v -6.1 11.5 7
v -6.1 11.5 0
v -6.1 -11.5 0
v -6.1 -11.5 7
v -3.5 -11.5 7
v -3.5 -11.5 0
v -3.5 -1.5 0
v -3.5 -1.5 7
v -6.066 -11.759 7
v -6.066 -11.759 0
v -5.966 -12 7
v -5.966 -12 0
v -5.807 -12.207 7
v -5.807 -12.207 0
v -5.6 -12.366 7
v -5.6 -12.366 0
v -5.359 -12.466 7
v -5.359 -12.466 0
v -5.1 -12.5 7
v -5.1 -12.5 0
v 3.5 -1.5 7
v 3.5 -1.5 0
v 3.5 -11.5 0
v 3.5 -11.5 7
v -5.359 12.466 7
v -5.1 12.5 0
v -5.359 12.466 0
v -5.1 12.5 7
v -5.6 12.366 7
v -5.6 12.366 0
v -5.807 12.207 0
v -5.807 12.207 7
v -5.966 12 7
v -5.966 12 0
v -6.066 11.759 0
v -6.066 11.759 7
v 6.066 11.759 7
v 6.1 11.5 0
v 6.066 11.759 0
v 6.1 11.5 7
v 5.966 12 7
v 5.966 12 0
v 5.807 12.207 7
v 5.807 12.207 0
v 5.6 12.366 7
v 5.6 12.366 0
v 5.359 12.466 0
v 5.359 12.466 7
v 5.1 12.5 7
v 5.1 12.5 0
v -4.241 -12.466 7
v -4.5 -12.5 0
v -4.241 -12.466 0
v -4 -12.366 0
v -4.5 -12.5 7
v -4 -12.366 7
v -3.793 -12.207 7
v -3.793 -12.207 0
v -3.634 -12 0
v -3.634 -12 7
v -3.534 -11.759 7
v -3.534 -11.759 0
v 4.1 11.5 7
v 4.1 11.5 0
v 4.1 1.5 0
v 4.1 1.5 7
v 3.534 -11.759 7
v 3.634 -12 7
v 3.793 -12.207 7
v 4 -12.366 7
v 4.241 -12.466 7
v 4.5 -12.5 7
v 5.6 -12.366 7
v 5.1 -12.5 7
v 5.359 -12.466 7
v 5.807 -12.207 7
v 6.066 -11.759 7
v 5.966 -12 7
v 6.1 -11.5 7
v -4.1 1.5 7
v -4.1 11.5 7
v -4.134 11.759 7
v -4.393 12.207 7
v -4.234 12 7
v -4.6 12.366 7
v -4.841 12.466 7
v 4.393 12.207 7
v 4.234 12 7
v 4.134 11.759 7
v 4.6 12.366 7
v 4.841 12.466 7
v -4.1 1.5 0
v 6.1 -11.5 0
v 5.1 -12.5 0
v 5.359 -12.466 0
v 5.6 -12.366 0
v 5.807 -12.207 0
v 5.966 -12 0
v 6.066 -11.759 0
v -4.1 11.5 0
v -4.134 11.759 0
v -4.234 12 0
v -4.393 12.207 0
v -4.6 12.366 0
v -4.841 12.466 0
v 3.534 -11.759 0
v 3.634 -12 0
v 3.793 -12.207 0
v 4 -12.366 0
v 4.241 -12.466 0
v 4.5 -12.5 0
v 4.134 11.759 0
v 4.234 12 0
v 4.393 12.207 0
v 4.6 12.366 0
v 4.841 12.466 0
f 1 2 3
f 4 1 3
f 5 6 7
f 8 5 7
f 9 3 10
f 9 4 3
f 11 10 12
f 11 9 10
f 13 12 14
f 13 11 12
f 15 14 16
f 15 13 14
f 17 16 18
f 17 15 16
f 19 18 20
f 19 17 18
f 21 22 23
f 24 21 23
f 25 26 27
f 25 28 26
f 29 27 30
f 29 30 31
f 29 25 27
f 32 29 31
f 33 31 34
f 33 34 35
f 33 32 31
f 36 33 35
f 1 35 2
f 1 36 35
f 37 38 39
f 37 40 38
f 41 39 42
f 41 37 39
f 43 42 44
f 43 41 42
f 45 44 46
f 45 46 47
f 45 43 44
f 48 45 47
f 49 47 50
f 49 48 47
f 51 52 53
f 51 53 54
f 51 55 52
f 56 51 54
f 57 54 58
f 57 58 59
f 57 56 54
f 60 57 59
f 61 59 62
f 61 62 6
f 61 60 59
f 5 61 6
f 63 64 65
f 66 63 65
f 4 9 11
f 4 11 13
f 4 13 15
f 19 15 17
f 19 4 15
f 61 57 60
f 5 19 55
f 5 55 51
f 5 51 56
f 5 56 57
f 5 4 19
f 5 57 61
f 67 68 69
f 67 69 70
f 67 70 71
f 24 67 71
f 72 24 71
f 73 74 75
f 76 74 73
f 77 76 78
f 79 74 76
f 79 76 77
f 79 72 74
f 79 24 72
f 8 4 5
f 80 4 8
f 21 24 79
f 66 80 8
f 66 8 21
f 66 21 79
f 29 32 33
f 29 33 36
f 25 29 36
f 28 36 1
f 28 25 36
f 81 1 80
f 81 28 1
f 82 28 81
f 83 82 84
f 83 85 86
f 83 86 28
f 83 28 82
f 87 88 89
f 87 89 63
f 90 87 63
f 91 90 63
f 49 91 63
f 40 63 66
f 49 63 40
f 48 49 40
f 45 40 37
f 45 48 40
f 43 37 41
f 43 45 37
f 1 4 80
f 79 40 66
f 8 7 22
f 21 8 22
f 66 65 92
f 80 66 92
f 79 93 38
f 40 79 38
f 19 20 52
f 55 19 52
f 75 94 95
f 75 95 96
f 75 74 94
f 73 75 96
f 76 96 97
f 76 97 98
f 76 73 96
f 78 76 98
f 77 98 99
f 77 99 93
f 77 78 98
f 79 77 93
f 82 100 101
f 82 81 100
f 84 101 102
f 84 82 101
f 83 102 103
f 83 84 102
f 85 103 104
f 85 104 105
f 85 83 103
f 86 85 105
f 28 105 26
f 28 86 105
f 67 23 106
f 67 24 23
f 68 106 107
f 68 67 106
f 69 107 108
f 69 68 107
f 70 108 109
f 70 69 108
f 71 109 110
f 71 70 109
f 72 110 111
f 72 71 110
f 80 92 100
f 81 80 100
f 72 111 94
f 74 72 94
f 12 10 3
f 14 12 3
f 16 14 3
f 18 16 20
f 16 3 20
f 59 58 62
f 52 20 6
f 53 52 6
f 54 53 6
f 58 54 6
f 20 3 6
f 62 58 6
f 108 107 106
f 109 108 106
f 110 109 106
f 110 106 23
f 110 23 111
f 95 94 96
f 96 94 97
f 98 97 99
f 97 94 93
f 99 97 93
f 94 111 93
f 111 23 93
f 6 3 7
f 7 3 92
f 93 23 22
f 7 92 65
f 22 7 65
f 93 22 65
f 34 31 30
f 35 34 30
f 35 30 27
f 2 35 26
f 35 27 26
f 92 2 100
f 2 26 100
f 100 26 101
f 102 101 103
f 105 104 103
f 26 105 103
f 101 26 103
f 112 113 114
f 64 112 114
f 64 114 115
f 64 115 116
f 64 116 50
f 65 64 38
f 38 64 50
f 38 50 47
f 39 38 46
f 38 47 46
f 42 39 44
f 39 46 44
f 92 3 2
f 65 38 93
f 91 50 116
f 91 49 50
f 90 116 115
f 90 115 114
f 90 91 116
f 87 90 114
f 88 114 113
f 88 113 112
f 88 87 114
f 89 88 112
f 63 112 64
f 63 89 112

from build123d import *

# Parameters (mm, degrees)
F1_DEPTH = 7
F2_R     = 0.99999


# Not quite as in the source:
# - a fillet or chamfer is up to 0.001 mm smaller than in the source, because OpenCascade refuses the exact size


with BuildPart() as f1:
    # F0 (on Top) → F1 (new body)
    with BuildSketch(Plane.XY):
        Polygon((4.1, 1.5), (0, 1.5), (-4.1, 1.5), (-4.1, 12.5), (-6.1, 12.5), (-6.1, -12.5), (-3.5, -12.5), (-3.5, -1.5), (0, -1.5), (3.5, -1.5), (3.5, -12.5), (6.1, -12.5), (6.1, 12.5), (4.1, 12.5), align=None)
    extrude(amount=F1_DEPTH)

    # F2 (radius 1 in the source; OpenCascade refuses exactly that, so slightly less here)
    f2_edges = [f1.edges().sort_by_distance(p)[0] for p in [
        (3.5, -12.5, 3.5),
        (6.1, -12.5, 3.5),
        (-3.5, -12.5, 3.5),
        (-6.1, -12.5, 3.5),
        (6.1, 12.5, 3.5),
        (4.1, 12.5, 3.5),
        (-4.1, 12.5, 3.5),
        (-6.1, 12.5, 3.5),
    ]]
    fillet(f2_edges, radius=F2_R)


solid = f1.part
